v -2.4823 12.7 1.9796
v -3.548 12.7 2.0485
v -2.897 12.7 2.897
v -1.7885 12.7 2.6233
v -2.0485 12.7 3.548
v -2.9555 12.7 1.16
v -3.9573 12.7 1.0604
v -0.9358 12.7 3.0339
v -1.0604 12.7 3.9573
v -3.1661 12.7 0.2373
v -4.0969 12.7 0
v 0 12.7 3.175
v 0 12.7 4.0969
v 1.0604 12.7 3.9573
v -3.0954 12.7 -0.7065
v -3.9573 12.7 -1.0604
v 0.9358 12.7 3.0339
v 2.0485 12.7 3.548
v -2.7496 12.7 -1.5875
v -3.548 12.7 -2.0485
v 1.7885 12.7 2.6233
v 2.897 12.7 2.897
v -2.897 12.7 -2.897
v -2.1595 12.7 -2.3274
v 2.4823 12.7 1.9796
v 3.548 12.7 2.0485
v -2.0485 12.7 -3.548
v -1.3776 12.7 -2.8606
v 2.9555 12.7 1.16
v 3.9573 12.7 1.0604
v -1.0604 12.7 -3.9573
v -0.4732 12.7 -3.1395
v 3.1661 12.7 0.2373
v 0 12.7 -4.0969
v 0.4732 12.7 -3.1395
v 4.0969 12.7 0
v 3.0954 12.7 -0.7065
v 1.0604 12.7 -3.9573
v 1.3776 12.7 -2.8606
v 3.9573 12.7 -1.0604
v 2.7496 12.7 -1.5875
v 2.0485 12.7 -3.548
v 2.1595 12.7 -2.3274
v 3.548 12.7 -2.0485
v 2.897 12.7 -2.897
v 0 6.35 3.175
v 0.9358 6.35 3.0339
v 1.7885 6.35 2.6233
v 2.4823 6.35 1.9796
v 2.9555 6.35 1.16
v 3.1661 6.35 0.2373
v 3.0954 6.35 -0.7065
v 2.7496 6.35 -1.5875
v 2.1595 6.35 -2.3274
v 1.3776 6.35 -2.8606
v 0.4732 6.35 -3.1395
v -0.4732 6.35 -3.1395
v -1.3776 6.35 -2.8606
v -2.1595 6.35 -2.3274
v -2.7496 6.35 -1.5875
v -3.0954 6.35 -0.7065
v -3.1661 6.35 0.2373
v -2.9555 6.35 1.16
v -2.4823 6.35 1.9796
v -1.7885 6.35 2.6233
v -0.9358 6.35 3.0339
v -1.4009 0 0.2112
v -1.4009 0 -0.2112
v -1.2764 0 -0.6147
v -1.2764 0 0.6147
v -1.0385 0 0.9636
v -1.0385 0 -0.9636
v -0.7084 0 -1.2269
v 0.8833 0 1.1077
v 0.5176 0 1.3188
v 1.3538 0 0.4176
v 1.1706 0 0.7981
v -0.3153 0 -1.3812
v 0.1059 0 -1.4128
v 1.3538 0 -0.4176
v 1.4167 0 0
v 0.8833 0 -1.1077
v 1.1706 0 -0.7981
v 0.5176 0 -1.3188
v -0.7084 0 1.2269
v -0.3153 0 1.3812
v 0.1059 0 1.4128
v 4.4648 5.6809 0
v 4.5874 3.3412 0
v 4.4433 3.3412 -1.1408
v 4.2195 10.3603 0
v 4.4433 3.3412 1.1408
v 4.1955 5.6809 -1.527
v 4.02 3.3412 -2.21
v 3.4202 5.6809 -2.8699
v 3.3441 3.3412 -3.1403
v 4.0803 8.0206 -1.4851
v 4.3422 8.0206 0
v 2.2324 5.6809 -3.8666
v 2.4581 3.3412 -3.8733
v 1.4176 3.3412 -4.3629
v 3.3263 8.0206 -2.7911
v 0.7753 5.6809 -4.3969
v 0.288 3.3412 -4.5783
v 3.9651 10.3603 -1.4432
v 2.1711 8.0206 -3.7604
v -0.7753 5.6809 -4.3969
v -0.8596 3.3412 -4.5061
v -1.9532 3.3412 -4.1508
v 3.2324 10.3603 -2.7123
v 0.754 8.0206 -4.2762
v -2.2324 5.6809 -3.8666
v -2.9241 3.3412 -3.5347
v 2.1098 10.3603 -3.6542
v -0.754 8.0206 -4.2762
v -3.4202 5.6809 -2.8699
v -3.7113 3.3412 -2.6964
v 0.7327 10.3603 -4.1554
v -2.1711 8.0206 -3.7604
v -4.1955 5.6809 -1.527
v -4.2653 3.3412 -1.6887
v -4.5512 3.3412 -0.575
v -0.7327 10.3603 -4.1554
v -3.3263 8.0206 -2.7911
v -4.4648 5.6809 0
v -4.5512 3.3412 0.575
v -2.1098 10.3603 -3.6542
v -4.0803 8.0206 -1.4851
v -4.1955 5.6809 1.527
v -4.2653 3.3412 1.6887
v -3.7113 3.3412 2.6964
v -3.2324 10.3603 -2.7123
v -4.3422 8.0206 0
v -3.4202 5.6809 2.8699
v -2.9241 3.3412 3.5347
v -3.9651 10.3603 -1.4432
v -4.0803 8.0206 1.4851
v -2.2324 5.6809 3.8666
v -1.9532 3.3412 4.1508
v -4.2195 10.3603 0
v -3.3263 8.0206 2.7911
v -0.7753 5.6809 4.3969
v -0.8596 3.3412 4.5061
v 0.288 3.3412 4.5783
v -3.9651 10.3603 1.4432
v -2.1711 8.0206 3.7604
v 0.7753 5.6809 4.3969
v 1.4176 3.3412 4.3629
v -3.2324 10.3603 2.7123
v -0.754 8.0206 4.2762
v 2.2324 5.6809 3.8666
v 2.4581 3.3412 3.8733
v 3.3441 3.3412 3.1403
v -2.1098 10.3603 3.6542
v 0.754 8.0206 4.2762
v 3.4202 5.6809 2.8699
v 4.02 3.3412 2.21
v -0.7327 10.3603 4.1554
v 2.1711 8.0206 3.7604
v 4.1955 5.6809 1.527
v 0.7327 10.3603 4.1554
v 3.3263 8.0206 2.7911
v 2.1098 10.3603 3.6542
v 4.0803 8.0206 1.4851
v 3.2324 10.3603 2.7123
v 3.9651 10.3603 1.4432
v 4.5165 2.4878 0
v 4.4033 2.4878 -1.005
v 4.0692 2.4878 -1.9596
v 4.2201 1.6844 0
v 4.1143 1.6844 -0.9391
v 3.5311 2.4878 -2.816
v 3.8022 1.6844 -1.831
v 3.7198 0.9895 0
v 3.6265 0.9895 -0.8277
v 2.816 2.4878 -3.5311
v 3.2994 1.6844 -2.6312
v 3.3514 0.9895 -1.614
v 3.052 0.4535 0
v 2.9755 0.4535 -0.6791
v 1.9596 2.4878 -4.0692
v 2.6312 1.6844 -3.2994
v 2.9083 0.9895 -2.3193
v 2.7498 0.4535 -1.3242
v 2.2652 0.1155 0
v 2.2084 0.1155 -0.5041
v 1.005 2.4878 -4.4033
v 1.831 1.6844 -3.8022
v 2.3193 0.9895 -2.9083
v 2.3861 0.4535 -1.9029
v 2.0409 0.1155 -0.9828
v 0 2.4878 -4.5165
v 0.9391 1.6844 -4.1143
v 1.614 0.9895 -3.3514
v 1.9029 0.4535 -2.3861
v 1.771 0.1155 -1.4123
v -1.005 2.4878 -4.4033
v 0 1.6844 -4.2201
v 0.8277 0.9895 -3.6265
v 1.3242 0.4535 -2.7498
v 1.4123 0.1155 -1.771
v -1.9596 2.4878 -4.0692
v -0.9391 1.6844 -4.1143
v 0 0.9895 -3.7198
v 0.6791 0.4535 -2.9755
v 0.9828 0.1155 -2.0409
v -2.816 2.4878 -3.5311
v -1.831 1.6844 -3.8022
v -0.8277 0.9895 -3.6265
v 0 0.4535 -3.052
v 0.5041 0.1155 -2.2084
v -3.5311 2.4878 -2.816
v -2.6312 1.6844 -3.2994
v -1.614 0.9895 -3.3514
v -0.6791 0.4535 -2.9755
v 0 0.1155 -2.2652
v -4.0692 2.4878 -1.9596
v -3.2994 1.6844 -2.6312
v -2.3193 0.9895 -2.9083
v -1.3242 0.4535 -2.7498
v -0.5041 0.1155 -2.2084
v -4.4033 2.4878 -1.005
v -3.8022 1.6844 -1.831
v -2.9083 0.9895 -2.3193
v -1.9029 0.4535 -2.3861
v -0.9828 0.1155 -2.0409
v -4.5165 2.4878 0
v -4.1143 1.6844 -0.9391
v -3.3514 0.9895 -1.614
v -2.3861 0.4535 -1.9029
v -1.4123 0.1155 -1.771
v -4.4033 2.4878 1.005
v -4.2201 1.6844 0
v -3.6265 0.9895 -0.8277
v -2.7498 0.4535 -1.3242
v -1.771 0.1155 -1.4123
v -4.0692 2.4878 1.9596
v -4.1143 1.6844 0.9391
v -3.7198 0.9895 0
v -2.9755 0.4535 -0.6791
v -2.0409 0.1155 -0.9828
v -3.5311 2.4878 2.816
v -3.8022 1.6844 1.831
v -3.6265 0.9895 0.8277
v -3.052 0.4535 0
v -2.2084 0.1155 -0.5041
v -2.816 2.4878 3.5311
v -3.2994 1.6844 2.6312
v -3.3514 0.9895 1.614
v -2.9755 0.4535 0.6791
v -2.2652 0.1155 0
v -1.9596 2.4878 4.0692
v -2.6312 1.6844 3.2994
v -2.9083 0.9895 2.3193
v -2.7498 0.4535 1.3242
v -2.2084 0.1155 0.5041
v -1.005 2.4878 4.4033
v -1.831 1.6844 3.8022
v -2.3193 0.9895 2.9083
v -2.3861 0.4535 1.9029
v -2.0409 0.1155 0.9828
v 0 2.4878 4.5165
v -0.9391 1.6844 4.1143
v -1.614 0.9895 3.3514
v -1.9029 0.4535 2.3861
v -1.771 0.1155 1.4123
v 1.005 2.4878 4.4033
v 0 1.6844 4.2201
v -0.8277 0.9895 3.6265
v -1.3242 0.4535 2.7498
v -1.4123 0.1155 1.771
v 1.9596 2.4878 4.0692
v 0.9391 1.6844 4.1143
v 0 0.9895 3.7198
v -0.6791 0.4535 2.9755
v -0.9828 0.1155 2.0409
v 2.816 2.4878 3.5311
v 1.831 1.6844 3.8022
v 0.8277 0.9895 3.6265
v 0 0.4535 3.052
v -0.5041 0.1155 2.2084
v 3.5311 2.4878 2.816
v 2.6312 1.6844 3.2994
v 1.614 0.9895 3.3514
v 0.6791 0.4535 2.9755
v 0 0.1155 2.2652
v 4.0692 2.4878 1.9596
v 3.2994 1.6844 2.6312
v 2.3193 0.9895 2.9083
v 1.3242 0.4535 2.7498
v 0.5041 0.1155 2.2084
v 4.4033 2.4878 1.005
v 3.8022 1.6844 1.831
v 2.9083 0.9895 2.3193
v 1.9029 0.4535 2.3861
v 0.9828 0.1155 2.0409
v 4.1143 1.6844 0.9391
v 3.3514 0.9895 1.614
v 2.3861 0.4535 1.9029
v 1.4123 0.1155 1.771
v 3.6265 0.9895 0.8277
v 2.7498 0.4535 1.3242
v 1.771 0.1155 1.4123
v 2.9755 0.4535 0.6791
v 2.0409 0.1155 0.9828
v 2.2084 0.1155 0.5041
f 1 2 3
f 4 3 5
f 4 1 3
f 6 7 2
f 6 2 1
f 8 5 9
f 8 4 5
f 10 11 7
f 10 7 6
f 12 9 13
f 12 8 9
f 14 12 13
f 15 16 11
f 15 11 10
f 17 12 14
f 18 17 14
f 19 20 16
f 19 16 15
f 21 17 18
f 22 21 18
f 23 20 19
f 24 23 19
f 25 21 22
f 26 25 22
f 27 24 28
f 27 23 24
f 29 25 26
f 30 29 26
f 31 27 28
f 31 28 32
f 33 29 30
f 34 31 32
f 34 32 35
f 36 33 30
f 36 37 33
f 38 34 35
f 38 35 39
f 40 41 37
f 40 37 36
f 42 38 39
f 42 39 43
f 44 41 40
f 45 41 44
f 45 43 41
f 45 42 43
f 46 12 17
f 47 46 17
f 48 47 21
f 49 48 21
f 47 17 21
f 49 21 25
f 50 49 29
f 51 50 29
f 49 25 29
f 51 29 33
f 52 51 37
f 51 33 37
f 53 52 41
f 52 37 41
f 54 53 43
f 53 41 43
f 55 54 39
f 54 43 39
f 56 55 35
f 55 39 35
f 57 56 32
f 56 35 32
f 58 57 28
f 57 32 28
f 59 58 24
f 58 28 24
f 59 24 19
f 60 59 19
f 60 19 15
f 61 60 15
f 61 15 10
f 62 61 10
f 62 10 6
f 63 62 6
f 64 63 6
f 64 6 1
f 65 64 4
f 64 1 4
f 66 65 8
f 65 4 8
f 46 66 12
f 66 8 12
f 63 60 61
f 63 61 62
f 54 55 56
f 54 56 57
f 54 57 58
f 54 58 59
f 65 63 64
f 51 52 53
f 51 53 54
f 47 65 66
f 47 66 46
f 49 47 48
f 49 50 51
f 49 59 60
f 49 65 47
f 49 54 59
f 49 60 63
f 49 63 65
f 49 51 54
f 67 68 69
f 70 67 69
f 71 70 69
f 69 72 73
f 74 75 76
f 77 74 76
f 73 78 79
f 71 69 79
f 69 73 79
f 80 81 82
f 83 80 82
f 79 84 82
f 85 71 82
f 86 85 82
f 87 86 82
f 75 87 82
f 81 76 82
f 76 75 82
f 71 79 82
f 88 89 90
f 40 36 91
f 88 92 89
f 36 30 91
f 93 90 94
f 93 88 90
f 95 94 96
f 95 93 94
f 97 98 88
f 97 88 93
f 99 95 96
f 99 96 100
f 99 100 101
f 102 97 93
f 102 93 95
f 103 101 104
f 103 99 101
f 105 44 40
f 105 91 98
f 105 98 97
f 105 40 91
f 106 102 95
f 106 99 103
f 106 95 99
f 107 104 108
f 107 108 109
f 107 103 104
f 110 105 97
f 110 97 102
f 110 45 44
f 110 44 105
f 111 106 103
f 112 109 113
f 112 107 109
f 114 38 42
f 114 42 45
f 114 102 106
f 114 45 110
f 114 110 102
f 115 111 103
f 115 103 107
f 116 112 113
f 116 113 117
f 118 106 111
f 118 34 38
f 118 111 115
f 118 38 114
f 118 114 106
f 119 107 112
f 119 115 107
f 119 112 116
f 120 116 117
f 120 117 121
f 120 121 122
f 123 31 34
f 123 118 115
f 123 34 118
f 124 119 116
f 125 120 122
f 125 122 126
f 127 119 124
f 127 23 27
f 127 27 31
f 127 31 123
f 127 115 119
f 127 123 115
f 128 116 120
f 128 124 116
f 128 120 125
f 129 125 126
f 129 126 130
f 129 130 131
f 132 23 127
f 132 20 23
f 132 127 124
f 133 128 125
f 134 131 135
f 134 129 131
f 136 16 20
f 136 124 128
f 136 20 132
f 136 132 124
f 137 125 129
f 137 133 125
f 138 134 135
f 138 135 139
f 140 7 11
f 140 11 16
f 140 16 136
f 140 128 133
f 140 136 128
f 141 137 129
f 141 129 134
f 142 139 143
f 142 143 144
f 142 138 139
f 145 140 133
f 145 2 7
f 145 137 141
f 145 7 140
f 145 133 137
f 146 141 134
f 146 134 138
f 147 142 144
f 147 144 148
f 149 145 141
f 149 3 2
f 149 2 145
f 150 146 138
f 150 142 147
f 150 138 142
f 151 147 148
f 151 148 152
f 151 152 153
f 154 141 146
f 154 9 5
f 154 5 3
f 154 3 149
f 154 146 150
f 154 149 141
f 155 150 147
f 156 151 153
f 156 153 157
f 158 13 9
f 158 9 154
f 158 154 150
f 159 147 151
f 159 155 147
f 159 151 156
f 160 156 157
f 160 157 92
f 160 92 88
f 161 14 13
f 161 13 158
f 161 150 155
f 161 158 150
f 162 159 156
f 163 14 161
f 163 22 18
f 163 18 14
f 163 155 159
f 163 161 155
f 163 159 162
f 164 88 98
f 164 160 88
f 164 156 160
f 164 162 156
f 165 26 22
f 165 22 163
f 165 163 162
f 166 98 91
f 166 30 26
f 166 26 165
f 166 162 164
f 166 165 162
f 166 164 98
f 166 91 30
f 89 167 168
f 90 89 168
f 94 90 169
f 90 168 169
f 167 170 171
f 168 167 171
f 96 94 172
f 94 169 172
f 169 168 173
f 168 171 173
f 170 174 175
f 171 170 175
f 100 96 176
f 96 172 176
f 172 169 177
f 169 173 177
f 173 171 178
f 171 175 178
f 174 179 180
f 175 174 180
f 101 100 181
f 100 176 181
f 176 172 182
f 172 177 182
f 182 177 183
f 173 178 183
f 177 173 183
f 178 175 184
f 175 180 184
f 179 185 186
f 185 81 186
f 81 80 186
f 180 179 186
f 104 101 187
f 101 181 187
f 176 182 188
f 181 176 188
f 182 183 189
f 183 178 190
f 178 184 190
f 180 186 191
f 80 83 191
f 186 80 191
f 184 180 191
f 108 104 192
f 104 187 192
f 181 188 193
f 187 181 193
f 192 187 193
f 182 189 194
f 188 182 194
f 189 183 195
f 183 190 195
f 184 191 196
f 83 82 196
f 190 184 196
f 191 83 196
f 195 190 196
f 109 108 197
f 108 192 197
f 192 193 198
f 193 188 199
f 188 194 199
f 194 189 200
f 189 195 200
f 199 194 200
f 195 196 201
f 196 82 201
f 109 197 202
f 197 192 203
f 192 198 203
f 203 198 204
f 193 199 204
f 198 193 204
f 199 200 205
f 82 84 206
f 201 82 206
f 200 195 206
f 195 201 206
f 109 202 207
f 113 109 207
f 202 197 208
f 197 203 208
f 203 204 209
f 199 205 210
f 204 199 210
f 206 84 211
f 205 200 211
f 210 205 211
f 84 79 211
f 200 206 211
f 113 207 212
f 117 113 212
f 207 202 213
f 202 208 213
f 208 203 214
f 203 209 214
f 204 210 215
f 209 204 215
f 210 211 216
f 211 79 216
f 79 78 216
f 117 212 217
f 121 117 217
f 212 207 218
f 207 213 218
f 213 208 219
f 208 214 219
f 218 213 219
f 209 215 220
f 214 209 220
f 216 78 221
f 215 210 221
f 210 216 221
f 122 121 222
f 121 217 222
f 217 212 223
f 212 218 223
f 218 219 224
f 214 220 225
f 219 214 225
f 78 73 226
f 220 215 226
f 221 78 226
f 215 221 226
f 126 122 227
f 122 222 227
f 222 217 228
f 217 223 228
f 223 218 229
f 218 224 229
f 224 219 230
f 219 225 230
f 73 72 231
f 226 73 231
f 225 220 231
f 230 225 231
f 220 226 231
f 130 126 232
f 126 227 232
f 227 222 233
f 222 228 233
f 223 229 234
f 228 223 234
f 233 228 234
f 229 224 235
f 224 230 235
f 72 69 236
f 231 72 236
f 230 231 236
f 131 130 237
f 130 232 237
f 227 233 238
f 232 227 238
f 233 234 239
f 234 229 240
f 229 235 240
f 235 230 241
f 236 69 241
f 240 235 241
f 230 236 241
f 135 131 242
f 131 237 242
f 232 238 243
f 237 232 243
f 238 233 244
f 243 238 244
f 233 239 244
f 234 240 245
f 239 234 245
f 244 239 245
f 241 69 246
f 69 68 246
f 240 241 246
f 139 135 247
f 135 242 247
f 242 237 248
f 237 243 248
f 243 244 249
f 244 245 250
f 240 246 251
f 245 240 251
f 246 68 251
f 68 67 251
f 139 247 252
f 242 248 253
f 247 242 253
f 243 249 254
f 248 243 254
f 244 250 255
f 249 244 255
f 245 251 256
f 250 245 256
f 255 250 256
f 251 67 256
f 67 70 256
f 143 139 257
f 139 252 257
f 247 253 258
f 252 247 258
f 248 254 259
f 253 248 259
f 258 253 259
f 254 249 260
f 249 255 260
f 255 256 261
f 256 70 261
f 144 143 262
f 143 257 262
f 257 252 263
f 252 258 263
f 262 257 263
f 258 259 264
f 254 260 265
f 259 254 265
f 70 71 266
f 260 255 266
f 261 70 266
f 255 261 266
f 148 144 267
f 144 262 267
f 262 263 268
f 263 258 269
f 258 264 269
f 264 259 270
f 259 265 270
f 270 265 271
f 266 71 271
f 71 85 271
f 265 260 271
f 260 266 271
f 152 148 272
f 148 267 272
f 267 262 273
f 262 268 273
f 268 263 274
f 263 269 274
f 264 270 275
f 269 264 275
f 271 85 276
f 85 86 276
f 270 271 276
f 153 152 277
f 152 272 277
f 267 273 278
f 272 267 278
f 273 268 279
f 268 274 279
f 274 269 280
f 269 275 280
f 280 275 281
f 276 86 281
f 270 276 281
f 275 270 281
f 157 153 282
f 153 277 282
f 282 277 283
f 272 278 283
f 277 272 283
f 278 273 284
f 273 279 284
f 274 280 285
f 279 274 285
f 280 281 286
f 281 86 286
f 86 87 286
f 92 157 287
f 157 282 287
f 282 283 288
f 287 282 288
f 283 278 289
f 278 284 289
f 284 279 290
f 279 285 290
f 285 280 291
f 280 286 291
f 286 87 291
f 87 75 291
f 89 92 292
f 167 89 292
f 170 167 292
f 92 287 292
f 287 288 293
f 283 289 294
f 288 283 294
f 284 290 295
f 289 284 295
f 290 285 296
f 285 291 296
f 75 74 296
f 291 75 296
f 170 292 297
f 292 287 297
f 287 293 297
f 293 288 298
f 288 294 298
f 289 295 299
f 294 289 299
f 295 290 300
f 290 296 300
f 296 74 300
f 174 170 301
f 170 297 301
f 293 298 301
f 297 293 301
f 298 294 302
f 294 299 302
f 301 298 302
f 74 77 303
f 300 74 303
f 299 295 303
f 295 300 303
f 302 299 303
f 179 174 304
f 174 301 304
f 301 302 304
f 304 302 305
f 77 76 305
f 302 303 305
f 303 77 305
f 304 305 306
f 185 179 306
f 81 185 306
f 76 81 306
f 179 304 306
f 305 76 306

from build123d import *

# Parameters (mm, degrees)
SKETCH2_R          = 4.7625
BASE_EXTRUDE_DEPTH = 12.7
BASE_EXTRUDE_TAPER = 3
FILLET1_R          = 3.175
SKETCH3_R          = 3.175
CUT_EXTRUDE1_DEPTH = 6.35


with BuildPart() as part:
    # Sketch2 → Base-Extrude (new body)
    with BuildSketch(Plane(origin=(0, 0, 0), x_dir=(1, 0, 0), z_dir=(0, 1, 0))):
        Circle(SKETCH2_R)
    extrude(amount=BASE_EXTRUDE_DEPTH, taper=BASE_EXTRUDE_TAPER)

    # Fillet1
    fillet1_edges = [part.edges().sort_by_distance(p)[0] for p in [
        (-4.7625, 0, 0),
    ]]
    fillet(fillet1_edges, radius=FILLET1_R)

    # Sketch3 → Cut-Extrude1 (cut)
    with BuildSketch(Plane(origin=(0, 12.7, 0), x_dir=(-1, 0, 0), z_dir=(0, 1, 0))):
        with Locations(Location((0, 0, 0), (0, 0, 90))):
            Circle(SKETCH3_R)
    extrude(amount=-CUT_EXTRUDE1_DEPTH, mode=Mode.SUBTRACT)


solid = part.part
